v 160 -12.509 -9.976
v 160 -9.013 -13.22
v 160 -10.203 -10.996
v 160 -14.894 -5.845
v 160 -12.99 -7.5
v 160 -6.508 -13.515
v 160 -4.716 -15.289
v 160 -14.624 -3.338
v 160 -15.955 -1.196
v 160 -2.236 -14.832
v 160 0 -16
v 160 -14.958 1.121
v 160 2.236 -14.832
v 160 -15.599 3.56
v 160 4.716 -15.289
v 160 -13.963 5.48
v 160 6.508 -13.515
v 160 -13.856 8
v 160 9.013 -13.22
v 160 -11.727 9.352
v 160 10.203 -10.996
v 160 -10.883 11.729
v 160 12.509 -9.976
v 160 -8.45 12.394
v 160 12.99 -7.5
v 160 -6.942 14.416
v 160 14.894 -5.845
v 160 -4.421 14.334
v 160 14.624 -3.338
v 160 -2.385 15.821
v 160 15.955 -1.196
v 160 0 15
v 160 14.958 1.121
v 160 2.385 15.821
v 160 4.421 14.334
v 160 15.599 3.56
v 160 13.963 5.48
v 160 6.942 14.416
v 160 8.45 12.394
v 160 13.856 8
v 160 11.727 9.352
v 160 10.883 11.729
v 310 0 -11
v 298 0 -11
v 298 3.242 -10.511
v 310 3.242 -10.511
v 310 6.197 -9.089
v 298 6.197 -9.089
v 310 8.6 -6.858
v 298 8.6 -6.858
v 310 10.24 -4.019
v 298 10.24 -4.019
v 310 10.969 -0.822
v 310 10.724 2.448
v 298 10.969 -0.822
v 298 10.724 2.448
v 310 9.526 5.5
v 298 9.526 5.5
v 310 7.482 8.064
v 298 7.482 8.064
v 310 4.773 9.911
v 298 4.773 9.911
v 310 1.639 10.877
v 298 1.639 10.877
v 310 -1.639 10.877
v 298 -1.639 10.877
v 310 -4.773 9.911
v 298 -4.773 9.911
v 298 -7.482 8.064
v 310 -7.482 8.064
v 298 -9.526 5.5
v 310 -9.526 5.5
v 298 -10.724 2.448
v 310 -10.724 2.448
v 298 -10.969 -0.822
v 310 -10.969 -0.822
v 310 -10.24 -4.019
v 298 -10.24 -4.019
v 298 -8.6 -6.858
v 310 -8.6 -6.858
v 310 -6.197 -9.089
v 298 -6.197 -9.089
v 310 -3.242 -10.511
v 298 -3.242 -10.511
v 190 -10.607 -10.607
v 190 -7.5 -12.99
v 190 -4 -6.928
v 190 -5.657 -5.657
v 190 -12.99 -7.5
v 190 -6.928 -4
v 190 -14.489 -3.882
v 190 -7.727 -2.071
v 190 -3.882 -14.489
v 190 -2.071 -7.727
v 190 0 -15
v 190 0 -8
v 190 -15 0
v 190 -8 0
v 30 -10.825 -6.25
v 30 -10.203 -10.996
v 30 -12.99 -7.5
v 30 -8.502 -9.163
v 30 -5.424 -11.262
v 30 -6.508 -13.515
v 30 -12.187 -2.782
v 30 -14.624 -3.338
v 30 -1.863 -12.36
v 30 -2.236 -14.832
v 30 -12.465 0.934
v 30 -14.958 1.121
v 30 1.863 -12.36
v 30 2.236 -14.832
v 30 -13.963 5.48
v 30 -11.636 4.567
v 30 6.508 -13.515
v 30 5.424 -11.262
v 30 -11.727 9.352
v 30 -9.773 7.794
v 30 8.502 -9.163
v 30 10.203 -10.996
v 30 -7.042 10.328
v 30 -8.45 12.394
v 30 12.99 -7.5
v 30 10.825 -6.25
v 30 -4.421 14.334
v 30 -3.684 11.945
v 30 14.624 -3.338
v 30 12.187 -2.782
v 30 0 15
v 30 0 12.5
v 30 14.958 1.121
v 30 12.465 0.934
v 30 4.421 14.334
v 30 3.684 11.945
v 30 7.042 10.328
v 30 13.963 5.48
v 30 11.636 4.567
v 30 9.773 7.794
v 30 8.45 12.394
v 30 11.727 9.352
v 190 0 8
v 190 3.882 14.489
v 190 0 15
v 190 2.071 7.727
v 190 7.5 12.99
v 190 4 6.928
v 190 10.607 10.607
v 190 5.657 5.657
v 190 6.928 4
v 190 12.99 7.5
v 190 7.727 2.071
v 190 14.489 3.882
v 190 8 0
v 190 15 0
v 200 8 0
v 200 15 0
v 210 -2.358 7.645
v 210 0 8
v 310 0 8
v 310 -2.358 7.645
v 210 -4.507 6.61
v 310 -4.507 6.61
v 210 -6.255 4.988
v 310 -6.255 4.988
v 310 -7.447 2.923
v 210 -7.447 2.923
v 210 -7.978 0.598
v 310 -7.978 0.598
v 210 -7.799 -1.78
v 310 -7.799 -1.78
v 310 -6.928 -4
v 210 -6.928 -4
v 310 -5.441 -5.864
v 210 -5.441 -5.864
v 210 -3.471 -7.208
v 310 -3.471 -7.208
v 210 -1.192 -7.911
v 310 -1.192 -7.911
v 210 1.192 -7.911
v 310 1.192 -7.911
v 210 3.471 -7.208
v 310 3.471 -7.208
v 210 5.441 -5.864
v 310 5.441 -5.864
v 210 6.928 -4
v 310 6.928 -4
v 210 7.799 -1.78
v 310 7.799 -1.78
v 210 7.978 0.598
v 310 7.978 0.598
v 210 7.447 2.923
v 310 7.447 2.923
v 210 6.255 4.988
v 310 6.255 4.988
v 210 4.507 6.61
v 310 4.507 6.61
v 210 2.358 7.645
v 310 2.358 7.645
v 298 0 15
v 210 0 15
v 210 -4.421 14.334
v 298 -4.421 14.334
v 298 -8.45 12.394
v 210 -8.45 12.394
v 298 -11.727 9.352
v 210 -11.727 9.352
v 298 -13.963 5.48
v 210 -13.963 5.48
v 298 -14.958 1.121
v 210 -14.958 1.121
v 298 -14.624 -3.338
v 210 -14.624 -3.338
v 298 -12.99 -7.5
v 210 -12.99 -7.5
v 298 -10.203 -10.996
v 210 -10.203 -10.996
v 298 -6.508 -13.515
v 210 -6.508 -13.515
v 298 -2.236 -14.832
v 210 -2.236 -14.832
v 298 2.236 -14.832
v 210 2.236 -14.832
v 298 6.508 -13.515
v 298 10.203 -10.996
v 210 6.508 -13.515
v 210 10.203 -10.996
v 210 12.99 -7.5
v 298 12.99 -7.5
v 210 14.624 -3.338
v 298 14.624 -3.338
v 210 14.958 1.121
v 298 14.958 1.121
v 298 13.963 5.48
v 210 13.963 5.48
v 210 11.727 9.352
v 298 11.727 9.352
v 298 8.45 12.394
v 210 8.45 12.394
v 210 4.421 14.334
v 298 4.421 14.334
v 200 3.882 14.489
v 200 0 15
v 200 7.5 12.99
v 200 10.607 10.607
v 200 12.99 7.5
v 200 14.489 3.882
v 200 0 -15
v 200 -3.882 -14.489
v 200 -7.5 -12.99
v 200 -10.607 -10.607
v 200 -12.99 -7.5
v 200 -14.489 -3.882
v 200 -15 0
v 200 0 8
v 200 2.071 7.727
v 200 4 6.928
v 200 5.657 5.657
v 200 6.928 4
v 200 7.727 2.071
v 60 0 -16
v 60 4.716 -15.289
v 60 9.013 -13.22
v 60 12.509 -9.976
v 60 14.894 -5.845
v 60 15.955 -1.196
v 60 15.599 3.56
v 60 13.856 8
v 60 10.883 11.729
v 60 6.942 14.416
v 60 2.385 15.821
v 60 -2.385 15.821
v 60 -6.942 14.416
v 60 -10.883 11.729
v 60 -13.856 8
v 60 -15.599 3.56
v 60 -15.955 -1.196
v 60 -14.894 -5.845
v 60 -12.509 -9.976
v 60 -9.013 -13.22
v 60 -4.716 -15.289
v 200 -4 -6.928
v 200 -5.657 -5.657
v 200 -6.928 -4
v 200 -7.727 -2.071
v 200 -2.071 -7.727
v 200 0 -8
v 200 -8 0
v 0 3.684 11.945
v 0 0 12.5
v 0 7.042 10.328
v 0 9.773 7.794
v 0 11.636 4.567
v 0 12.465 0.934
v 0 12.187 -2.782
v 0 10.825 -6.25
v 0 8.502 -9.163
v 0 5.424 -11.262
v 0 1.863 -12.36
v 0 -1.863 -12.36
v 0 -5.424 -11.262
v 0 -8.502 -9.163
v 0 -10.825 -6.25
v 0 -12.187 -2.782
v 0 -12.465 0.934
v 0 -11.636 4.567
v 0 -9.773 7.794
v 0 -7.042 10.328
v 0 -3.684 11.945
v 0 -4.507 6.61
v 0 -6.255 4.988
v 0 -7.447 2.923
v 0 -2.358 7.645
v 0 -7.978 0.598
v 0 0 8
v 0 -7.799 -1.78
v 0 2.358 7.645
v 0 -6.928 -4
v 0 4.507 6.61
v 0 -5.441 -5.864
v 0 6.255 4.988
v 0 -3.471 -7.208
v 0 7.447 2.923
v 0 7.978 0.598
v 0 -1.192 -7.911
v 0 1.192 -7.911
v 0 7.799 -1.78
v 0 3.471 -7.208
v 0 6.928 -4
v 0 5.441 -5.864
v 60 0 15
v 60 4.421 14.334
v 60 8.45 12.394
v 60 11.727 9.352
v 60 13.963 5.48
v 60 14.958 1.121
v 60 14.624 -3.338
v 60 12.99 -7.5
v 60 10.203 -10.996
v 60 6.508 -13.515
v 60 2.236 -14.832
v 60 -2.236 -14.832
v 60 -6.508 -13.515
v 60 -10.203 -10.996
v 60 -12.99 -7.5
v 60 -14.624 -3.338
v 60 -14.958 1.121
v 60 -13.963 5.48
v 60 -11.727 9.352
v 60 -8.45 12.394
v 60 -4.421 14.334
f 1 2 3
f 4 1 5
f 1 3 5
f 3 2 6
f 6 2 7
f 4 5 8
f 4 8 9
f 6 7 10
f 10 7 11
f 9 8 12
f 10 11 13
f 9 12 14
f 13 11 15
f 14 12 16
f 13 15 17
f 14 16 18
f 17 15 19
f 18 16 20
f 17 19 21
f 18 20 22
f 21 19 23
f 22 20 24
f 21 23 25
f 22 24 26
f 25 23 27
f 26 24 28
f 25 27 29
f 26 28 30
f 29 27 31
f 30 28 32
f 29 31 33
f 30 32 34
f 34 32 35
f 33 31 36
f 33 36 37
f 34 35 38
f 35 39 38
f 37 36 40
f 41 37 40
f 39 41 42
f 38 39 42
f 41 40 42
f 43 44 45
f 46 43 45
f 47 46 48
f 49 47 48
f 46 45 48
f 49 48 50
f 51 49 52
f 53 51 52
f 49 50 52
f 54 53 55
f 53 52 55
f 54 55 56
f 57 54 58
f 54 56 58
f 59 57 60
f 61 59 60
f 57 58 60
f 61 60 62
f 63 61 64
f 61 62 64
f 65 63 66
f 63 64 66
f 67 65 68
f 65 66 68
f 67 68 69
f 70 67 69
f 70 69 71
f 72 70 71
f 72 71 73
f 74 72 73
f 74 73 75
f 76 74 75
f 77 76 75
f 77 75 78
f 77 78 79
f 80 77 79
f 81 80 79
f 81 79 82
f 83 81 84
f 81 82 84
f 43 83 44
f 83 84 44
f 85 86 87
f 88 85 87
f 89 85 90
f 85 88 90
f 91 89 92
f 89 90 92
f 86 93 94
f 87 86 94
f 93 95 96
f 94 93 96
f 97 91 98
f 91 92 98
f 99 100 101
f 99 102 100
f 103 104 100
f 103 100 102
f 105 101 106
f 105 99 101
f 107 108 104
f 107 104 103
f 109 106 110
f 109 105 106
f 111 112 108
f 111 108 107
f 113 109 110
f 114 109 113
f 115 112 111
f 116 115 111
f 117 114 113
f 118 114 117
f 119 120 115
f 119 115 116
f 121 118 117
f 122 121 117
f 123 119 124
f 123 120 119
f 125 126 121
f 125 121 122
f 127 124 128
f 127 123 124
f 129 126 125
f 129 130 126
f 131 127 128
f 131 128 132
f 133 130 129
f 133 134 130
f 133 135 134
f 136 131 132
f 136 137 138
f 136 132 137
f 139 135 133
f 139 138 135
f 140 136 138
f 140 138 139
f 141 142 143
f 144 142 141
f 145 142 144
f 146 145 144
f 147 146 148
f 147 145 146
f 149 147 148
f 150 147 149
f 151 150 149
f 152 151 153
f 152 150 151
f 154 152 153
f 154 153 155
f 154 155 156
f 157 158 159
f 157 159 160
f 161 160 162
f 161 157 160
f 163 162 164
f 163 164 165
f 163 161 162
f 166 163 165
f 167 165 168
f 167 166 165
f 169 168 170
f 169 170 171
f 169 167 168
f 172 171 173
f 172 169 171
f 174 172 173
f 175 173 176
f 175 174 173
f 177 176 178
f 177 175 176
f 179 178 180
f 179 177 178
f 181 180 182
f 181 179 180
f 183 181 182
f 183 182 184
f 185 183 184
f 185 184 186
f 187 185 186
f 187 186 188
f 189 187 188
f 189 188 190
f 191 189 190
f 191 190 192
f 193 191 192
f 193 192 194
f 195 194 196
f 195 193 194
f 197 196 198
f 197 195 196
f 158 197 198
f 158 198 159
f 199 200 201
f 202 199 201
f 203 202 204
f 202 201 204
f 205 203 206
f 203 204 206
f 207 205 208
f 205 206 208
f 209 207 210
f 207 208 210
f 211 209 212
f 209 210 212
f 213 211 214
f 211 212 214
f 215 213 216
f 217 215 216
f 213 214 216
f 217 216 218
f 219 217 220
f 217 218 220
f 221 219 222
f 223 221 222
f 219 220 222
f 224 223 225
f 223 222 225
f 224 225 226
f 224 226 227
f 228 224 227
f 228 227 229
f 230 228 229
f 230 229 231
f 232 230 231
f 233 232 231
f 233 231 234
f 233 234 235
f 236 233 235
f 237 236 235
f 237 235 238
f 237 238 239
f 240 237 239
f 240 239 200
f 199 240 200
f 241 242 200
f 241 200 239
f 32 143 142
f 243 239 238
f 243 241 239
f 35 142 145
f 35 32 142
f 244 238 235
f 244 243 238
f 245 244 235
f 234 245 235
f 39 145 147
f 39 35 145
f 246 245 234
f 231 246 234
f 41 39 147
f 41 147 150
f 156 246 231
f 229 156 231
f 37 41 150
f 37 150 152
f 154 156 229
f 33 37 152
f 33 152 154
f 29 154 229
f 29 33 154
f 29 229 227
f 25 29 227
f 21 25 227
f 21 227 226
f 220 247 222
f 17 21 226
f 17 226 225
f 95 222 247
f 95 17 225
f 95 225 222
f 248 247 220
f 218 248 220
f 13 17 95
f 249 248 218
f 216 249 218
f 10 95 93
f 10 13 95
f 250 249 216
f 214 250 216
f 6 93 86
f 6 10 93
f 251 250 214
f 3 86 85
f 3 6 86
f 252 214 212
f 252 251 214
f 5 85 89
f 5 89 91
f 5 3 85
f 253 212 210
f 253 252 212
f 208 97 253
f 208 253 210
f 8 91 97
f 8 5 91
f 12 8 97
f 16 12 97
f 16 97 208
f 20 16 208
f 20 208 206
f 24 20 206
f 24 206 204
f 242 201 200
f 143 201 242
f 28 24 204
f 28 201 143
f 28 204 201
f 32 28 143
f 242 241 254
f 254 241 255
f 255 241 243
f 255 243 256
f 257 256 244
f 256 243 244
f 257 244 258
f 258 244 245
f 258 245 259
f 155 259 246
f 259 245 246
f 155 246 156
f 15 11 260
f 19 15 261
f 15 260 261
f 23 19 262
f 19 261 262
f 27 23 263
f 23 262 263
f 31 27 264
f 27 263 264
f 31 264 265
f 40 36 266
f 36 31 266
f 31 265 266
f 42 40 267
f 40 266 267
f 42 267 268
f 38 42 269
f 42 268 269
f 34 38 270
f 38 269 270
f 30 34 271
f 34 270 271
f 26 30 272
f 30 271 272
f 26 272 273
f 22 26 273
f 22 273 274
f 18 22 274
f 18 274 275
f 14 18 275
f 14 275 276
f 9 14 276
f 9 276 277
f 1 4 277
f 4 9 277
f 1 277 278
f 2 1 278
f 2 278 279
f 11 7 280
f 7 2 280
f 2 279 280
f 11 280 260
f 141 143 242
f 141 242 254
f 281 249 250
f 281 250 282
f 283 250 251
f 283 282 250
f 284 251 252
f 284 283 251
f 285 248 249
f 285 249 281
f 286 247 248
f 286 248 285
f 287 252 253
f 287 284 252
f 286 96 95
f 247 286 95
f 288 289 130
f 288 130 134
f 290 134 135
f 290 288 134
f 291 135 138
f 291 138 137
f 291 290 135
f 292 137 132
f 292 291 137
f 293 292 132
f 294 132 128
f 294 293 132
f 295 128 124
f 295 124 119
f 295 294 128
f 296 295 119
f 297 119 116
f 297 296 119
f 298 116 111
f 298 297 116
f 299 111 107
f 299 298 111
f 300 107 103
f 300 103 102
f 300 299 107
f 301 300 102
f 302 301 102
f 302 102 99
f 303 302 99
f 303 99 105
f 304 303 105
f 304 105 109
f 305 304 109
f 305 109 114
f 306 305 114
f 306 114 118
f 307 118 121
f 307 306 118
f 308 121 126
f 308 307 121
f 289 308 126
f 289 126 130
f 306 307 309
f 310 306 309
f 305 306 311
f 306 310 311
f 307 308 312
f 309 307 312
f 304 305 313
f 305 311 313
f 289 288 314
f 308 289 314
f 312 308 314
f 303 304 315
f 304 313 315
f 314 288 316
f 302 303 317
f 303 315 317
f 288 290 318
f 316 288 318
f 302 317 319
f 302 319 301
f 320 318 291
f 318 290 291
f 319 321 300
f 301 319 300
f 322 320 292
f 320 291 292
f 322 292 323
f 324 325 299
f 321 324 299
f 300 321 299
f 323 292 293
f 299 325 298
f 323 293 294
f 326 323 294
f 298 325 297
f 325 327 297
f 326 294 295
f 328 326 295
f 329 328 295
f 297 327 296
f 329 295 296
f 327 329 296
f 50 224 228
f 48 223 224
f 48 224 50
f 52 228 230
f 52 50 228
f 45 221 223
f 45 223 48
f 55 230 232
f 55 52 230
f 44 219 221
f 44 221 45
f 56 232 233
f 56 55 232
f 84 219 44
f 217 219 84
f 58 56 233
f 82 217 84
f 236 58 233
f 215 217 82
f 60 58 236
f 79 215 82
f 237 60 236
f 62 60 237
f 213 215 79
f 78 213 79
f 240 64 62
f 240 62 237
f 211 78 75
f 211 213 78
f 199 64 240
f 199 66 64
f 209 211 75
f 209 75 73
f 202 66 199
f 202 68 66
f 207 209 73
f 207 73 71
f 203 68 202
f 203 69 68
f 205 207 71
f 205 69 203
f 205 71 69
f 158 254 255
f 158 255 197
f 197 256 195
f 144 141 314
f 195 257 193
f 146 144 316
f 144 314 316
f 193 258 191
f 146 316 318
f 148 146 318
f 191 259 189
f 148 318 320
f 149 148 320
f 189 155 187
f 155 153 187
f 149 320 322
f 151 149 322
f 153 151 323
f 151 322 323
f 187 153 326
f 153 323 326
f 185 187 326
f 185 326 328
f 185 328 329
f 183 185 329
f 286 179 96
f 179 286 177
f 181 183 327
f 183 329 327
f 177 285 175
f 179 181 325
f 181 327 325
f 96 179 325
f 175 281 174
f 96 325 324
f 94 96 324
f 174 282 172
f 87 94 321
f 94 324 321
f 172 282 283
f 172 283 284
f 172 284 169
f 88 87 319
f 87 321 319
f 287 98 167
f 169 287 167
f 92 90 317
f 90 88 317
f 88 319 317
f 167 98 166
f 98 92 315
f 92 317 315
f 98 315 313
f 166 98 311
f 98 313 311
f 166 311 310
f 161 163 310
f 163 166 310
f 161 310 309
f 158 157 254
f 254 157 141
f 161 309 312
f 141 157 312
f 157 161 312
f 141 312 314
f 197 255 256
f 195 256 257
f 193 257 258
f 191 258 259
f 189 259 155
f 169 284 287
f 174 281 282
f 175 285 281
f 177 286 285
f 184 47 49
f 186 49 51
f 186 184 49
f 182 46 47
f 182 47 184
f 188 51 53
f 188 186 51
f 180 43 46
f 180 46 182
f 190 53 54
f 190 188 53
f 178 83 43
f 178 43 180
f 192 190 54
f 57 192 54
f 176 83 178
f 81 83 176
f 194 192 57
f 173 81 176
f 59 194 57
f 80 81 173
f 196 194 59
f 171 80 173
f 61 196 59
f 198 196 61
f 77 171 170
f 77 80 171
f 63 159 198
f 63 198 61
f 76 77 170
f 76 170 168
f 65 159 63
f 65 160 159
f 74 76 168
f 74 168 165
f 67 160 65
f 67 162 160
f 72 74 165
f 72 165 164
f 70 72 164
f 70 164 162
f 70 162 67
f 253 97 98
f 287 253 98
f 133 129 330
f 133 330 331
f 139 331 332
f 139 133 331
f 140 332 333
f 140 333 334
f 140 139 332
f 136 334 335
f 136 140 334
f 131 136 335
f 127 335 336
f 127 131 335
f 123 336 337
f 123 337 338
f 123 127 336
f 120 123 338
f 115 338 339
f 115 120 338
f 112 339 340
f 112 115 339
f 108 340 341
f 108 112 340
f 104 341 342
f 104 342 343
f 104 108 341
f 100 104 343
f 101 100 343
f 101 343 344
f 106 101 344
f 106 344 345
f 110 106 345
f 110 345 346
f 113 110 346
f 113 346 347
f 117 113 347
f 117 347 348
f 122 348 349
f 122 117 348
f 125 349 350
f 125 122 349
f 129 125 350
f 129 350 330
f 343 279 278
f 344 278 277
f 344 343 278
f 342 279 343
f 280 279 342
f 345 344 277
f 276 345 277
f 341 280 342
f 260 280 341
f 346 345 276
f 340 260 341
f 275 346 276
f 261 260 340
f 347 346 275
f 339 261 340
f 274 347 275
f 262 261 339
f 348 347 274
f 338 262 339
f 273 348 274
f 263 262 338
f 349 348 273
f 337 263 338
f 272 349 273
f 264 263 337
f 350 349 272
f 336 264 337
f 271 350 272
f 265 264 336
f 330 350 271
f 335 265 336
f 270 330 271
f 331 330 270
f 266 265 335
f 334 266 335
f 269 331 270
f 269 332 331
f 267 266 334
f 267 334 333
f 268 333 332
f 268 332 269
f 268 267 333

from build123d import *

# Parameters (mm, degrees)
SKETCH_1_R           = 16
EXTRUDE_1_DEPTH      = 100
EXTRUDE_START        = -18
SKETCH_2_R           = 16
EXTRUDE_2_DEPTH      = 18
SKETCH_3_R           = 16
EXTRUDE_3_DEPTH      = 132
SKETCH_4_R           = 16
EXTRUDE_4_DEPTH      = 18
SKETCH_5_R           = 16
EXTRUDE_5_DEPTH      = 50
SKETCH_6_R           = 16
EXTRUDE_6_DEPTH      = 80
SKETCH_7_R           = 16
EXTRUDE_7_DEPTH      = 50
SKETCH_9_R           = 8
EXTRUDE_8_DEPTH      = 20
SKETCH_13_R          = 8
CUT_EXTRUDE_5_DEPTH  = 450
SKETCH_14_R          = 16
SKETCH_14_R_2        = 12.5
CUT_EXTRUDE_6_DEPTH  = 30
SKETCH_16_R          = 16
SKETCH_16_R_2        = 15
CUT_EXTRUDE_8_DEPTH  = 30
SKETCH_17_R          = 16
SKETCH_17_R_2        = 15
CUT_EXTRUDE_9_DEPTH  = 60
CUT_EXTRUDE_START    = -200
SKETCH_18_R          = 16
CUT_EXTRUDE_10_DEPTH = 200
CUT_EXTRUDE_START_2  = -20
SKETCH_19_R          = 16
SKETCH_19_R_2        = 8
CUT_EXTRUDE_11_DEPTH = 20
SKETCH_20_R          = 15
SKETCH_20_R_2        = 8
EXTRUDE_9_DEPTH      = 100
CUT_EXTRUDE_START_3  = -10
CUT_EXTRUDE_12_DEPTH = 10
CUT_EXTRUDE_START_4  = -12
SKETCH_22_R          = 15
SKETCH_22_R_2        = 11
CUT_EXTRUDE_13_DEPTH = 12


with BuildPart() as part:
    # 草图1 → 凸台-拉伸1 (new body)
    with BuildSketch(Plane(origin=(0, 0, 0), x_dir=(0, 0, -1), z_dir=(1, 0, 0))):
        Circle(SKETCH_1_R)
    extrude(amount=EXTRUDE_1_DEPTH)

    # 草图2 → 凸台-拉伸2 (add)
    with BuildSketch(Plane(origin=(100, 0, 0), x_dir=(0, 0, -1), z_dir=(1, 0, 0)).offset(EXTRUDE_START)):
        Circle(SKETCH_2_R)
    extrude(amount=EXTRUDE_2_DEPTH)

    # 草图3 → 凸台-拉伸3 (add)
    with BuildSketch(Plane(origin=(100, 0, 0), x_dir=(0, 0, -1), z_dir=(1, 0, 0))):
        Circle(SKETCH_3_R)
    extrude(amount=EXTRUDE_3_DEPTH)

    # 草图4 → 凸台-拉伸4 (add)
    with BuildSketch(Plane(origin=(232, 0, 0), x_dir=(0, 0, -1), z_dir=(1, 0, 0))):
        Circle(SKETCH_4_R)
    extrude(amount=EXTRUDE_4_DEPTH)

    # 草图5 → 凸台-拉伸5 (add)
    with BuildSketch(Plane(origin=(250, 0, 0), x_dir=(0, 0, -1), z_dir=(1, 0, 0))):
        Circle(SKETCH_5_R)
    extrude(amount=EXTRUDE_5_DEPTH)

    # 草图6 → 凸台-拉伸6 (add)
    with BuildSketch(Plane(origin=(300, 0, 0), x_dir=(0, 0, -1), z_dir=(1, 0, 0))):
        Circle(SKETCH_6_R)
    extrude(amount=EXTRUDE_6_DEPTH)

    # 草图7 → 凸台-拉伸7 (add)
    with BuildSketch(Plane(origin=(380, 0, 0), x_dir=(0, 0, -1), z_dir=(1, 0, 0))):
        Circle(SKETCH_7_R)
    extrude(amount=EXTRUDE_7_DEPTH)

    # 草图9 → 凸台-拉伸8 (add)
    with BuildSketch(Plane(origin=(430, 0, 0), x_dir=(0, 0, -1), z_dir=(1, 0, 0))):
        Circle(SKETCH_9_R)
    extrude(amount=EXTRUDE_8_DEPTH)

    # 草图13 → 切除-拉伸5 (cut)
    with BuildSketch(Plane.ZY):
        Circle(SKETCH_13_R)
    extrude(amount=-CUT_EXTRUDE_5_DEPTH, mode=Mode.SUBTRACT)

    # 草图14 → 切除-拉伸6 (cut)
    with BuildSketch(Plane.ZY):
        Circle(SKETCH_14_R)
        Circle(SKETCH_14_R_2, mode=Mode.SUBTRACT)
    extrude(amount=-CUT_EXTRUDE_6_DEPTH, mode=Mode.SUBTRACT)

    # 草图16 → 切除-拉伸8 (cut)
    with BuildSketch(Plane.ZY.offset(-30)):
        Circle(SKETCH_16_R)
        Circle(SKETCH_16_R_2, mode=Mode.SUBTRACT)
    extrude(amount=-CUT_EXTRUDE_8_DEPTH, mode=Mode.SUBTRACT)

    # 草图17 → 切除-拉伸9 (cut)
    with BuildSketch(Plane.ZY.offset(-160)):
        Circle(SKETCH_17_R)
        Circle(SKETCH_17_R_2, mode=Mode.SUBTRACT)
    extrude(amount=-CUT_EXTRUDE_9_DEPTH, mode=Mode.SUBTRACT)

    # 草图18 → 切除-拉伸10 (cut)
    with BuildSketch(Plane(origin=(430, 0, 0), x_dir=(0, 0, -1), z_dir=(1, 0, 0)).offset(CUT_EXTRUDE_START)):
        with Locations(Location((0, 0, 0), (0, 0, 180))):
            Circle(SKETCH_18_R)
    extrude(amount=CUT_EXTRUDE_10_DEPTH, mode=Mode.SUBTRACT)

    # 草图19 → 切除-拉伸11 (cut)
    with BuildSketch(Plane(origin=(230, 0, 0), x_dir=(0, 0, -1), z_dir=(1, 0, 0)).offset(CUT_EXTRUDE_START_2)):
        with Locations(Location((0, 0, 0), (0, 0, 180))):
            Circle(SKETCH_19_R)
        with Locations(Location((0, 0, 0), (0, 0, 180))):
            Circle(SKETCH_19_R_2, mode=Mode.SUBTRACT)
    extrude(amount=CUT_EXTRUDE_11_DEPTH, mode=Mode.SUBTRACT)

    # 草图20 → 凸台-拉伸9 (add)
    with BuildSketch(Plane(origin=(210, 0, 0), x_dir=(0, 0, -1), z_dir=(1, 0, 0))):
        with Locations(Location((0, 0, 0), (0, 0, 180))):
            Circle(SKETCH_20_R)
        with Locations(Location((0, 0, 0), (0, 0, 180))):
            Circle(SKETCH_20_R_2, mode=Mode.SUBTRACT)
    extrude(amount=EXTRUDE_9_DEPTH)

    # 草图21 → 切除-拉伸12 (cut)
    with BuildSketch(Plane(origin=(200, 0, 0), x_dir=(0, 0, -1), z_dir=(1, 0, 0)).offset(CUT_EXTRUDE_START_3)):
        with BuildLine():
            Line((-15, 0), (-8, 0))
            ThreePointArc((-8, 0), (-5.656854249, 5.656854249), (0, 8))
            Line((0, 8), (0, 15))
            ThreePointArc((0, 15), (-10.606601718, 10.606601718), (-15, 0))
        make_face()
        with BuildLine():
            Line((8, 0), (15, 0))
            ThreePointArc((15, 0), (10.606601718, -10.606601718), (0, -15))
            Line((0, -15), (0, -8))
            ThreePointArc((0, -8), (5.656854249, -5.656854249), (8, 0))
        make_face()
    extrude(amount=CUT_EXTRUDE_12_DEPTH, mode=Mode.SUBTRACT)

    # 草图22 → 切除-拉伸13 (cut)
    with BuildSketch(Plane(origin=(310, 0, 0), x_dir=(0, 0, -1), z_dir=(1, 0, 0)).offset(CUT_EXTRUDE_START_4)):
        with Locations(Location((0, 0, 0), (0, 0, 180))):
            Circle(SKETCH_22_R)
        Circle(SKETCH_22_R_2, mode=Mode.SUBTRACT)
    extrude(amount=CUT_EXTRUDE_13_DEPTH, mode=Mode.SUBTRACT)


solid = part.part
